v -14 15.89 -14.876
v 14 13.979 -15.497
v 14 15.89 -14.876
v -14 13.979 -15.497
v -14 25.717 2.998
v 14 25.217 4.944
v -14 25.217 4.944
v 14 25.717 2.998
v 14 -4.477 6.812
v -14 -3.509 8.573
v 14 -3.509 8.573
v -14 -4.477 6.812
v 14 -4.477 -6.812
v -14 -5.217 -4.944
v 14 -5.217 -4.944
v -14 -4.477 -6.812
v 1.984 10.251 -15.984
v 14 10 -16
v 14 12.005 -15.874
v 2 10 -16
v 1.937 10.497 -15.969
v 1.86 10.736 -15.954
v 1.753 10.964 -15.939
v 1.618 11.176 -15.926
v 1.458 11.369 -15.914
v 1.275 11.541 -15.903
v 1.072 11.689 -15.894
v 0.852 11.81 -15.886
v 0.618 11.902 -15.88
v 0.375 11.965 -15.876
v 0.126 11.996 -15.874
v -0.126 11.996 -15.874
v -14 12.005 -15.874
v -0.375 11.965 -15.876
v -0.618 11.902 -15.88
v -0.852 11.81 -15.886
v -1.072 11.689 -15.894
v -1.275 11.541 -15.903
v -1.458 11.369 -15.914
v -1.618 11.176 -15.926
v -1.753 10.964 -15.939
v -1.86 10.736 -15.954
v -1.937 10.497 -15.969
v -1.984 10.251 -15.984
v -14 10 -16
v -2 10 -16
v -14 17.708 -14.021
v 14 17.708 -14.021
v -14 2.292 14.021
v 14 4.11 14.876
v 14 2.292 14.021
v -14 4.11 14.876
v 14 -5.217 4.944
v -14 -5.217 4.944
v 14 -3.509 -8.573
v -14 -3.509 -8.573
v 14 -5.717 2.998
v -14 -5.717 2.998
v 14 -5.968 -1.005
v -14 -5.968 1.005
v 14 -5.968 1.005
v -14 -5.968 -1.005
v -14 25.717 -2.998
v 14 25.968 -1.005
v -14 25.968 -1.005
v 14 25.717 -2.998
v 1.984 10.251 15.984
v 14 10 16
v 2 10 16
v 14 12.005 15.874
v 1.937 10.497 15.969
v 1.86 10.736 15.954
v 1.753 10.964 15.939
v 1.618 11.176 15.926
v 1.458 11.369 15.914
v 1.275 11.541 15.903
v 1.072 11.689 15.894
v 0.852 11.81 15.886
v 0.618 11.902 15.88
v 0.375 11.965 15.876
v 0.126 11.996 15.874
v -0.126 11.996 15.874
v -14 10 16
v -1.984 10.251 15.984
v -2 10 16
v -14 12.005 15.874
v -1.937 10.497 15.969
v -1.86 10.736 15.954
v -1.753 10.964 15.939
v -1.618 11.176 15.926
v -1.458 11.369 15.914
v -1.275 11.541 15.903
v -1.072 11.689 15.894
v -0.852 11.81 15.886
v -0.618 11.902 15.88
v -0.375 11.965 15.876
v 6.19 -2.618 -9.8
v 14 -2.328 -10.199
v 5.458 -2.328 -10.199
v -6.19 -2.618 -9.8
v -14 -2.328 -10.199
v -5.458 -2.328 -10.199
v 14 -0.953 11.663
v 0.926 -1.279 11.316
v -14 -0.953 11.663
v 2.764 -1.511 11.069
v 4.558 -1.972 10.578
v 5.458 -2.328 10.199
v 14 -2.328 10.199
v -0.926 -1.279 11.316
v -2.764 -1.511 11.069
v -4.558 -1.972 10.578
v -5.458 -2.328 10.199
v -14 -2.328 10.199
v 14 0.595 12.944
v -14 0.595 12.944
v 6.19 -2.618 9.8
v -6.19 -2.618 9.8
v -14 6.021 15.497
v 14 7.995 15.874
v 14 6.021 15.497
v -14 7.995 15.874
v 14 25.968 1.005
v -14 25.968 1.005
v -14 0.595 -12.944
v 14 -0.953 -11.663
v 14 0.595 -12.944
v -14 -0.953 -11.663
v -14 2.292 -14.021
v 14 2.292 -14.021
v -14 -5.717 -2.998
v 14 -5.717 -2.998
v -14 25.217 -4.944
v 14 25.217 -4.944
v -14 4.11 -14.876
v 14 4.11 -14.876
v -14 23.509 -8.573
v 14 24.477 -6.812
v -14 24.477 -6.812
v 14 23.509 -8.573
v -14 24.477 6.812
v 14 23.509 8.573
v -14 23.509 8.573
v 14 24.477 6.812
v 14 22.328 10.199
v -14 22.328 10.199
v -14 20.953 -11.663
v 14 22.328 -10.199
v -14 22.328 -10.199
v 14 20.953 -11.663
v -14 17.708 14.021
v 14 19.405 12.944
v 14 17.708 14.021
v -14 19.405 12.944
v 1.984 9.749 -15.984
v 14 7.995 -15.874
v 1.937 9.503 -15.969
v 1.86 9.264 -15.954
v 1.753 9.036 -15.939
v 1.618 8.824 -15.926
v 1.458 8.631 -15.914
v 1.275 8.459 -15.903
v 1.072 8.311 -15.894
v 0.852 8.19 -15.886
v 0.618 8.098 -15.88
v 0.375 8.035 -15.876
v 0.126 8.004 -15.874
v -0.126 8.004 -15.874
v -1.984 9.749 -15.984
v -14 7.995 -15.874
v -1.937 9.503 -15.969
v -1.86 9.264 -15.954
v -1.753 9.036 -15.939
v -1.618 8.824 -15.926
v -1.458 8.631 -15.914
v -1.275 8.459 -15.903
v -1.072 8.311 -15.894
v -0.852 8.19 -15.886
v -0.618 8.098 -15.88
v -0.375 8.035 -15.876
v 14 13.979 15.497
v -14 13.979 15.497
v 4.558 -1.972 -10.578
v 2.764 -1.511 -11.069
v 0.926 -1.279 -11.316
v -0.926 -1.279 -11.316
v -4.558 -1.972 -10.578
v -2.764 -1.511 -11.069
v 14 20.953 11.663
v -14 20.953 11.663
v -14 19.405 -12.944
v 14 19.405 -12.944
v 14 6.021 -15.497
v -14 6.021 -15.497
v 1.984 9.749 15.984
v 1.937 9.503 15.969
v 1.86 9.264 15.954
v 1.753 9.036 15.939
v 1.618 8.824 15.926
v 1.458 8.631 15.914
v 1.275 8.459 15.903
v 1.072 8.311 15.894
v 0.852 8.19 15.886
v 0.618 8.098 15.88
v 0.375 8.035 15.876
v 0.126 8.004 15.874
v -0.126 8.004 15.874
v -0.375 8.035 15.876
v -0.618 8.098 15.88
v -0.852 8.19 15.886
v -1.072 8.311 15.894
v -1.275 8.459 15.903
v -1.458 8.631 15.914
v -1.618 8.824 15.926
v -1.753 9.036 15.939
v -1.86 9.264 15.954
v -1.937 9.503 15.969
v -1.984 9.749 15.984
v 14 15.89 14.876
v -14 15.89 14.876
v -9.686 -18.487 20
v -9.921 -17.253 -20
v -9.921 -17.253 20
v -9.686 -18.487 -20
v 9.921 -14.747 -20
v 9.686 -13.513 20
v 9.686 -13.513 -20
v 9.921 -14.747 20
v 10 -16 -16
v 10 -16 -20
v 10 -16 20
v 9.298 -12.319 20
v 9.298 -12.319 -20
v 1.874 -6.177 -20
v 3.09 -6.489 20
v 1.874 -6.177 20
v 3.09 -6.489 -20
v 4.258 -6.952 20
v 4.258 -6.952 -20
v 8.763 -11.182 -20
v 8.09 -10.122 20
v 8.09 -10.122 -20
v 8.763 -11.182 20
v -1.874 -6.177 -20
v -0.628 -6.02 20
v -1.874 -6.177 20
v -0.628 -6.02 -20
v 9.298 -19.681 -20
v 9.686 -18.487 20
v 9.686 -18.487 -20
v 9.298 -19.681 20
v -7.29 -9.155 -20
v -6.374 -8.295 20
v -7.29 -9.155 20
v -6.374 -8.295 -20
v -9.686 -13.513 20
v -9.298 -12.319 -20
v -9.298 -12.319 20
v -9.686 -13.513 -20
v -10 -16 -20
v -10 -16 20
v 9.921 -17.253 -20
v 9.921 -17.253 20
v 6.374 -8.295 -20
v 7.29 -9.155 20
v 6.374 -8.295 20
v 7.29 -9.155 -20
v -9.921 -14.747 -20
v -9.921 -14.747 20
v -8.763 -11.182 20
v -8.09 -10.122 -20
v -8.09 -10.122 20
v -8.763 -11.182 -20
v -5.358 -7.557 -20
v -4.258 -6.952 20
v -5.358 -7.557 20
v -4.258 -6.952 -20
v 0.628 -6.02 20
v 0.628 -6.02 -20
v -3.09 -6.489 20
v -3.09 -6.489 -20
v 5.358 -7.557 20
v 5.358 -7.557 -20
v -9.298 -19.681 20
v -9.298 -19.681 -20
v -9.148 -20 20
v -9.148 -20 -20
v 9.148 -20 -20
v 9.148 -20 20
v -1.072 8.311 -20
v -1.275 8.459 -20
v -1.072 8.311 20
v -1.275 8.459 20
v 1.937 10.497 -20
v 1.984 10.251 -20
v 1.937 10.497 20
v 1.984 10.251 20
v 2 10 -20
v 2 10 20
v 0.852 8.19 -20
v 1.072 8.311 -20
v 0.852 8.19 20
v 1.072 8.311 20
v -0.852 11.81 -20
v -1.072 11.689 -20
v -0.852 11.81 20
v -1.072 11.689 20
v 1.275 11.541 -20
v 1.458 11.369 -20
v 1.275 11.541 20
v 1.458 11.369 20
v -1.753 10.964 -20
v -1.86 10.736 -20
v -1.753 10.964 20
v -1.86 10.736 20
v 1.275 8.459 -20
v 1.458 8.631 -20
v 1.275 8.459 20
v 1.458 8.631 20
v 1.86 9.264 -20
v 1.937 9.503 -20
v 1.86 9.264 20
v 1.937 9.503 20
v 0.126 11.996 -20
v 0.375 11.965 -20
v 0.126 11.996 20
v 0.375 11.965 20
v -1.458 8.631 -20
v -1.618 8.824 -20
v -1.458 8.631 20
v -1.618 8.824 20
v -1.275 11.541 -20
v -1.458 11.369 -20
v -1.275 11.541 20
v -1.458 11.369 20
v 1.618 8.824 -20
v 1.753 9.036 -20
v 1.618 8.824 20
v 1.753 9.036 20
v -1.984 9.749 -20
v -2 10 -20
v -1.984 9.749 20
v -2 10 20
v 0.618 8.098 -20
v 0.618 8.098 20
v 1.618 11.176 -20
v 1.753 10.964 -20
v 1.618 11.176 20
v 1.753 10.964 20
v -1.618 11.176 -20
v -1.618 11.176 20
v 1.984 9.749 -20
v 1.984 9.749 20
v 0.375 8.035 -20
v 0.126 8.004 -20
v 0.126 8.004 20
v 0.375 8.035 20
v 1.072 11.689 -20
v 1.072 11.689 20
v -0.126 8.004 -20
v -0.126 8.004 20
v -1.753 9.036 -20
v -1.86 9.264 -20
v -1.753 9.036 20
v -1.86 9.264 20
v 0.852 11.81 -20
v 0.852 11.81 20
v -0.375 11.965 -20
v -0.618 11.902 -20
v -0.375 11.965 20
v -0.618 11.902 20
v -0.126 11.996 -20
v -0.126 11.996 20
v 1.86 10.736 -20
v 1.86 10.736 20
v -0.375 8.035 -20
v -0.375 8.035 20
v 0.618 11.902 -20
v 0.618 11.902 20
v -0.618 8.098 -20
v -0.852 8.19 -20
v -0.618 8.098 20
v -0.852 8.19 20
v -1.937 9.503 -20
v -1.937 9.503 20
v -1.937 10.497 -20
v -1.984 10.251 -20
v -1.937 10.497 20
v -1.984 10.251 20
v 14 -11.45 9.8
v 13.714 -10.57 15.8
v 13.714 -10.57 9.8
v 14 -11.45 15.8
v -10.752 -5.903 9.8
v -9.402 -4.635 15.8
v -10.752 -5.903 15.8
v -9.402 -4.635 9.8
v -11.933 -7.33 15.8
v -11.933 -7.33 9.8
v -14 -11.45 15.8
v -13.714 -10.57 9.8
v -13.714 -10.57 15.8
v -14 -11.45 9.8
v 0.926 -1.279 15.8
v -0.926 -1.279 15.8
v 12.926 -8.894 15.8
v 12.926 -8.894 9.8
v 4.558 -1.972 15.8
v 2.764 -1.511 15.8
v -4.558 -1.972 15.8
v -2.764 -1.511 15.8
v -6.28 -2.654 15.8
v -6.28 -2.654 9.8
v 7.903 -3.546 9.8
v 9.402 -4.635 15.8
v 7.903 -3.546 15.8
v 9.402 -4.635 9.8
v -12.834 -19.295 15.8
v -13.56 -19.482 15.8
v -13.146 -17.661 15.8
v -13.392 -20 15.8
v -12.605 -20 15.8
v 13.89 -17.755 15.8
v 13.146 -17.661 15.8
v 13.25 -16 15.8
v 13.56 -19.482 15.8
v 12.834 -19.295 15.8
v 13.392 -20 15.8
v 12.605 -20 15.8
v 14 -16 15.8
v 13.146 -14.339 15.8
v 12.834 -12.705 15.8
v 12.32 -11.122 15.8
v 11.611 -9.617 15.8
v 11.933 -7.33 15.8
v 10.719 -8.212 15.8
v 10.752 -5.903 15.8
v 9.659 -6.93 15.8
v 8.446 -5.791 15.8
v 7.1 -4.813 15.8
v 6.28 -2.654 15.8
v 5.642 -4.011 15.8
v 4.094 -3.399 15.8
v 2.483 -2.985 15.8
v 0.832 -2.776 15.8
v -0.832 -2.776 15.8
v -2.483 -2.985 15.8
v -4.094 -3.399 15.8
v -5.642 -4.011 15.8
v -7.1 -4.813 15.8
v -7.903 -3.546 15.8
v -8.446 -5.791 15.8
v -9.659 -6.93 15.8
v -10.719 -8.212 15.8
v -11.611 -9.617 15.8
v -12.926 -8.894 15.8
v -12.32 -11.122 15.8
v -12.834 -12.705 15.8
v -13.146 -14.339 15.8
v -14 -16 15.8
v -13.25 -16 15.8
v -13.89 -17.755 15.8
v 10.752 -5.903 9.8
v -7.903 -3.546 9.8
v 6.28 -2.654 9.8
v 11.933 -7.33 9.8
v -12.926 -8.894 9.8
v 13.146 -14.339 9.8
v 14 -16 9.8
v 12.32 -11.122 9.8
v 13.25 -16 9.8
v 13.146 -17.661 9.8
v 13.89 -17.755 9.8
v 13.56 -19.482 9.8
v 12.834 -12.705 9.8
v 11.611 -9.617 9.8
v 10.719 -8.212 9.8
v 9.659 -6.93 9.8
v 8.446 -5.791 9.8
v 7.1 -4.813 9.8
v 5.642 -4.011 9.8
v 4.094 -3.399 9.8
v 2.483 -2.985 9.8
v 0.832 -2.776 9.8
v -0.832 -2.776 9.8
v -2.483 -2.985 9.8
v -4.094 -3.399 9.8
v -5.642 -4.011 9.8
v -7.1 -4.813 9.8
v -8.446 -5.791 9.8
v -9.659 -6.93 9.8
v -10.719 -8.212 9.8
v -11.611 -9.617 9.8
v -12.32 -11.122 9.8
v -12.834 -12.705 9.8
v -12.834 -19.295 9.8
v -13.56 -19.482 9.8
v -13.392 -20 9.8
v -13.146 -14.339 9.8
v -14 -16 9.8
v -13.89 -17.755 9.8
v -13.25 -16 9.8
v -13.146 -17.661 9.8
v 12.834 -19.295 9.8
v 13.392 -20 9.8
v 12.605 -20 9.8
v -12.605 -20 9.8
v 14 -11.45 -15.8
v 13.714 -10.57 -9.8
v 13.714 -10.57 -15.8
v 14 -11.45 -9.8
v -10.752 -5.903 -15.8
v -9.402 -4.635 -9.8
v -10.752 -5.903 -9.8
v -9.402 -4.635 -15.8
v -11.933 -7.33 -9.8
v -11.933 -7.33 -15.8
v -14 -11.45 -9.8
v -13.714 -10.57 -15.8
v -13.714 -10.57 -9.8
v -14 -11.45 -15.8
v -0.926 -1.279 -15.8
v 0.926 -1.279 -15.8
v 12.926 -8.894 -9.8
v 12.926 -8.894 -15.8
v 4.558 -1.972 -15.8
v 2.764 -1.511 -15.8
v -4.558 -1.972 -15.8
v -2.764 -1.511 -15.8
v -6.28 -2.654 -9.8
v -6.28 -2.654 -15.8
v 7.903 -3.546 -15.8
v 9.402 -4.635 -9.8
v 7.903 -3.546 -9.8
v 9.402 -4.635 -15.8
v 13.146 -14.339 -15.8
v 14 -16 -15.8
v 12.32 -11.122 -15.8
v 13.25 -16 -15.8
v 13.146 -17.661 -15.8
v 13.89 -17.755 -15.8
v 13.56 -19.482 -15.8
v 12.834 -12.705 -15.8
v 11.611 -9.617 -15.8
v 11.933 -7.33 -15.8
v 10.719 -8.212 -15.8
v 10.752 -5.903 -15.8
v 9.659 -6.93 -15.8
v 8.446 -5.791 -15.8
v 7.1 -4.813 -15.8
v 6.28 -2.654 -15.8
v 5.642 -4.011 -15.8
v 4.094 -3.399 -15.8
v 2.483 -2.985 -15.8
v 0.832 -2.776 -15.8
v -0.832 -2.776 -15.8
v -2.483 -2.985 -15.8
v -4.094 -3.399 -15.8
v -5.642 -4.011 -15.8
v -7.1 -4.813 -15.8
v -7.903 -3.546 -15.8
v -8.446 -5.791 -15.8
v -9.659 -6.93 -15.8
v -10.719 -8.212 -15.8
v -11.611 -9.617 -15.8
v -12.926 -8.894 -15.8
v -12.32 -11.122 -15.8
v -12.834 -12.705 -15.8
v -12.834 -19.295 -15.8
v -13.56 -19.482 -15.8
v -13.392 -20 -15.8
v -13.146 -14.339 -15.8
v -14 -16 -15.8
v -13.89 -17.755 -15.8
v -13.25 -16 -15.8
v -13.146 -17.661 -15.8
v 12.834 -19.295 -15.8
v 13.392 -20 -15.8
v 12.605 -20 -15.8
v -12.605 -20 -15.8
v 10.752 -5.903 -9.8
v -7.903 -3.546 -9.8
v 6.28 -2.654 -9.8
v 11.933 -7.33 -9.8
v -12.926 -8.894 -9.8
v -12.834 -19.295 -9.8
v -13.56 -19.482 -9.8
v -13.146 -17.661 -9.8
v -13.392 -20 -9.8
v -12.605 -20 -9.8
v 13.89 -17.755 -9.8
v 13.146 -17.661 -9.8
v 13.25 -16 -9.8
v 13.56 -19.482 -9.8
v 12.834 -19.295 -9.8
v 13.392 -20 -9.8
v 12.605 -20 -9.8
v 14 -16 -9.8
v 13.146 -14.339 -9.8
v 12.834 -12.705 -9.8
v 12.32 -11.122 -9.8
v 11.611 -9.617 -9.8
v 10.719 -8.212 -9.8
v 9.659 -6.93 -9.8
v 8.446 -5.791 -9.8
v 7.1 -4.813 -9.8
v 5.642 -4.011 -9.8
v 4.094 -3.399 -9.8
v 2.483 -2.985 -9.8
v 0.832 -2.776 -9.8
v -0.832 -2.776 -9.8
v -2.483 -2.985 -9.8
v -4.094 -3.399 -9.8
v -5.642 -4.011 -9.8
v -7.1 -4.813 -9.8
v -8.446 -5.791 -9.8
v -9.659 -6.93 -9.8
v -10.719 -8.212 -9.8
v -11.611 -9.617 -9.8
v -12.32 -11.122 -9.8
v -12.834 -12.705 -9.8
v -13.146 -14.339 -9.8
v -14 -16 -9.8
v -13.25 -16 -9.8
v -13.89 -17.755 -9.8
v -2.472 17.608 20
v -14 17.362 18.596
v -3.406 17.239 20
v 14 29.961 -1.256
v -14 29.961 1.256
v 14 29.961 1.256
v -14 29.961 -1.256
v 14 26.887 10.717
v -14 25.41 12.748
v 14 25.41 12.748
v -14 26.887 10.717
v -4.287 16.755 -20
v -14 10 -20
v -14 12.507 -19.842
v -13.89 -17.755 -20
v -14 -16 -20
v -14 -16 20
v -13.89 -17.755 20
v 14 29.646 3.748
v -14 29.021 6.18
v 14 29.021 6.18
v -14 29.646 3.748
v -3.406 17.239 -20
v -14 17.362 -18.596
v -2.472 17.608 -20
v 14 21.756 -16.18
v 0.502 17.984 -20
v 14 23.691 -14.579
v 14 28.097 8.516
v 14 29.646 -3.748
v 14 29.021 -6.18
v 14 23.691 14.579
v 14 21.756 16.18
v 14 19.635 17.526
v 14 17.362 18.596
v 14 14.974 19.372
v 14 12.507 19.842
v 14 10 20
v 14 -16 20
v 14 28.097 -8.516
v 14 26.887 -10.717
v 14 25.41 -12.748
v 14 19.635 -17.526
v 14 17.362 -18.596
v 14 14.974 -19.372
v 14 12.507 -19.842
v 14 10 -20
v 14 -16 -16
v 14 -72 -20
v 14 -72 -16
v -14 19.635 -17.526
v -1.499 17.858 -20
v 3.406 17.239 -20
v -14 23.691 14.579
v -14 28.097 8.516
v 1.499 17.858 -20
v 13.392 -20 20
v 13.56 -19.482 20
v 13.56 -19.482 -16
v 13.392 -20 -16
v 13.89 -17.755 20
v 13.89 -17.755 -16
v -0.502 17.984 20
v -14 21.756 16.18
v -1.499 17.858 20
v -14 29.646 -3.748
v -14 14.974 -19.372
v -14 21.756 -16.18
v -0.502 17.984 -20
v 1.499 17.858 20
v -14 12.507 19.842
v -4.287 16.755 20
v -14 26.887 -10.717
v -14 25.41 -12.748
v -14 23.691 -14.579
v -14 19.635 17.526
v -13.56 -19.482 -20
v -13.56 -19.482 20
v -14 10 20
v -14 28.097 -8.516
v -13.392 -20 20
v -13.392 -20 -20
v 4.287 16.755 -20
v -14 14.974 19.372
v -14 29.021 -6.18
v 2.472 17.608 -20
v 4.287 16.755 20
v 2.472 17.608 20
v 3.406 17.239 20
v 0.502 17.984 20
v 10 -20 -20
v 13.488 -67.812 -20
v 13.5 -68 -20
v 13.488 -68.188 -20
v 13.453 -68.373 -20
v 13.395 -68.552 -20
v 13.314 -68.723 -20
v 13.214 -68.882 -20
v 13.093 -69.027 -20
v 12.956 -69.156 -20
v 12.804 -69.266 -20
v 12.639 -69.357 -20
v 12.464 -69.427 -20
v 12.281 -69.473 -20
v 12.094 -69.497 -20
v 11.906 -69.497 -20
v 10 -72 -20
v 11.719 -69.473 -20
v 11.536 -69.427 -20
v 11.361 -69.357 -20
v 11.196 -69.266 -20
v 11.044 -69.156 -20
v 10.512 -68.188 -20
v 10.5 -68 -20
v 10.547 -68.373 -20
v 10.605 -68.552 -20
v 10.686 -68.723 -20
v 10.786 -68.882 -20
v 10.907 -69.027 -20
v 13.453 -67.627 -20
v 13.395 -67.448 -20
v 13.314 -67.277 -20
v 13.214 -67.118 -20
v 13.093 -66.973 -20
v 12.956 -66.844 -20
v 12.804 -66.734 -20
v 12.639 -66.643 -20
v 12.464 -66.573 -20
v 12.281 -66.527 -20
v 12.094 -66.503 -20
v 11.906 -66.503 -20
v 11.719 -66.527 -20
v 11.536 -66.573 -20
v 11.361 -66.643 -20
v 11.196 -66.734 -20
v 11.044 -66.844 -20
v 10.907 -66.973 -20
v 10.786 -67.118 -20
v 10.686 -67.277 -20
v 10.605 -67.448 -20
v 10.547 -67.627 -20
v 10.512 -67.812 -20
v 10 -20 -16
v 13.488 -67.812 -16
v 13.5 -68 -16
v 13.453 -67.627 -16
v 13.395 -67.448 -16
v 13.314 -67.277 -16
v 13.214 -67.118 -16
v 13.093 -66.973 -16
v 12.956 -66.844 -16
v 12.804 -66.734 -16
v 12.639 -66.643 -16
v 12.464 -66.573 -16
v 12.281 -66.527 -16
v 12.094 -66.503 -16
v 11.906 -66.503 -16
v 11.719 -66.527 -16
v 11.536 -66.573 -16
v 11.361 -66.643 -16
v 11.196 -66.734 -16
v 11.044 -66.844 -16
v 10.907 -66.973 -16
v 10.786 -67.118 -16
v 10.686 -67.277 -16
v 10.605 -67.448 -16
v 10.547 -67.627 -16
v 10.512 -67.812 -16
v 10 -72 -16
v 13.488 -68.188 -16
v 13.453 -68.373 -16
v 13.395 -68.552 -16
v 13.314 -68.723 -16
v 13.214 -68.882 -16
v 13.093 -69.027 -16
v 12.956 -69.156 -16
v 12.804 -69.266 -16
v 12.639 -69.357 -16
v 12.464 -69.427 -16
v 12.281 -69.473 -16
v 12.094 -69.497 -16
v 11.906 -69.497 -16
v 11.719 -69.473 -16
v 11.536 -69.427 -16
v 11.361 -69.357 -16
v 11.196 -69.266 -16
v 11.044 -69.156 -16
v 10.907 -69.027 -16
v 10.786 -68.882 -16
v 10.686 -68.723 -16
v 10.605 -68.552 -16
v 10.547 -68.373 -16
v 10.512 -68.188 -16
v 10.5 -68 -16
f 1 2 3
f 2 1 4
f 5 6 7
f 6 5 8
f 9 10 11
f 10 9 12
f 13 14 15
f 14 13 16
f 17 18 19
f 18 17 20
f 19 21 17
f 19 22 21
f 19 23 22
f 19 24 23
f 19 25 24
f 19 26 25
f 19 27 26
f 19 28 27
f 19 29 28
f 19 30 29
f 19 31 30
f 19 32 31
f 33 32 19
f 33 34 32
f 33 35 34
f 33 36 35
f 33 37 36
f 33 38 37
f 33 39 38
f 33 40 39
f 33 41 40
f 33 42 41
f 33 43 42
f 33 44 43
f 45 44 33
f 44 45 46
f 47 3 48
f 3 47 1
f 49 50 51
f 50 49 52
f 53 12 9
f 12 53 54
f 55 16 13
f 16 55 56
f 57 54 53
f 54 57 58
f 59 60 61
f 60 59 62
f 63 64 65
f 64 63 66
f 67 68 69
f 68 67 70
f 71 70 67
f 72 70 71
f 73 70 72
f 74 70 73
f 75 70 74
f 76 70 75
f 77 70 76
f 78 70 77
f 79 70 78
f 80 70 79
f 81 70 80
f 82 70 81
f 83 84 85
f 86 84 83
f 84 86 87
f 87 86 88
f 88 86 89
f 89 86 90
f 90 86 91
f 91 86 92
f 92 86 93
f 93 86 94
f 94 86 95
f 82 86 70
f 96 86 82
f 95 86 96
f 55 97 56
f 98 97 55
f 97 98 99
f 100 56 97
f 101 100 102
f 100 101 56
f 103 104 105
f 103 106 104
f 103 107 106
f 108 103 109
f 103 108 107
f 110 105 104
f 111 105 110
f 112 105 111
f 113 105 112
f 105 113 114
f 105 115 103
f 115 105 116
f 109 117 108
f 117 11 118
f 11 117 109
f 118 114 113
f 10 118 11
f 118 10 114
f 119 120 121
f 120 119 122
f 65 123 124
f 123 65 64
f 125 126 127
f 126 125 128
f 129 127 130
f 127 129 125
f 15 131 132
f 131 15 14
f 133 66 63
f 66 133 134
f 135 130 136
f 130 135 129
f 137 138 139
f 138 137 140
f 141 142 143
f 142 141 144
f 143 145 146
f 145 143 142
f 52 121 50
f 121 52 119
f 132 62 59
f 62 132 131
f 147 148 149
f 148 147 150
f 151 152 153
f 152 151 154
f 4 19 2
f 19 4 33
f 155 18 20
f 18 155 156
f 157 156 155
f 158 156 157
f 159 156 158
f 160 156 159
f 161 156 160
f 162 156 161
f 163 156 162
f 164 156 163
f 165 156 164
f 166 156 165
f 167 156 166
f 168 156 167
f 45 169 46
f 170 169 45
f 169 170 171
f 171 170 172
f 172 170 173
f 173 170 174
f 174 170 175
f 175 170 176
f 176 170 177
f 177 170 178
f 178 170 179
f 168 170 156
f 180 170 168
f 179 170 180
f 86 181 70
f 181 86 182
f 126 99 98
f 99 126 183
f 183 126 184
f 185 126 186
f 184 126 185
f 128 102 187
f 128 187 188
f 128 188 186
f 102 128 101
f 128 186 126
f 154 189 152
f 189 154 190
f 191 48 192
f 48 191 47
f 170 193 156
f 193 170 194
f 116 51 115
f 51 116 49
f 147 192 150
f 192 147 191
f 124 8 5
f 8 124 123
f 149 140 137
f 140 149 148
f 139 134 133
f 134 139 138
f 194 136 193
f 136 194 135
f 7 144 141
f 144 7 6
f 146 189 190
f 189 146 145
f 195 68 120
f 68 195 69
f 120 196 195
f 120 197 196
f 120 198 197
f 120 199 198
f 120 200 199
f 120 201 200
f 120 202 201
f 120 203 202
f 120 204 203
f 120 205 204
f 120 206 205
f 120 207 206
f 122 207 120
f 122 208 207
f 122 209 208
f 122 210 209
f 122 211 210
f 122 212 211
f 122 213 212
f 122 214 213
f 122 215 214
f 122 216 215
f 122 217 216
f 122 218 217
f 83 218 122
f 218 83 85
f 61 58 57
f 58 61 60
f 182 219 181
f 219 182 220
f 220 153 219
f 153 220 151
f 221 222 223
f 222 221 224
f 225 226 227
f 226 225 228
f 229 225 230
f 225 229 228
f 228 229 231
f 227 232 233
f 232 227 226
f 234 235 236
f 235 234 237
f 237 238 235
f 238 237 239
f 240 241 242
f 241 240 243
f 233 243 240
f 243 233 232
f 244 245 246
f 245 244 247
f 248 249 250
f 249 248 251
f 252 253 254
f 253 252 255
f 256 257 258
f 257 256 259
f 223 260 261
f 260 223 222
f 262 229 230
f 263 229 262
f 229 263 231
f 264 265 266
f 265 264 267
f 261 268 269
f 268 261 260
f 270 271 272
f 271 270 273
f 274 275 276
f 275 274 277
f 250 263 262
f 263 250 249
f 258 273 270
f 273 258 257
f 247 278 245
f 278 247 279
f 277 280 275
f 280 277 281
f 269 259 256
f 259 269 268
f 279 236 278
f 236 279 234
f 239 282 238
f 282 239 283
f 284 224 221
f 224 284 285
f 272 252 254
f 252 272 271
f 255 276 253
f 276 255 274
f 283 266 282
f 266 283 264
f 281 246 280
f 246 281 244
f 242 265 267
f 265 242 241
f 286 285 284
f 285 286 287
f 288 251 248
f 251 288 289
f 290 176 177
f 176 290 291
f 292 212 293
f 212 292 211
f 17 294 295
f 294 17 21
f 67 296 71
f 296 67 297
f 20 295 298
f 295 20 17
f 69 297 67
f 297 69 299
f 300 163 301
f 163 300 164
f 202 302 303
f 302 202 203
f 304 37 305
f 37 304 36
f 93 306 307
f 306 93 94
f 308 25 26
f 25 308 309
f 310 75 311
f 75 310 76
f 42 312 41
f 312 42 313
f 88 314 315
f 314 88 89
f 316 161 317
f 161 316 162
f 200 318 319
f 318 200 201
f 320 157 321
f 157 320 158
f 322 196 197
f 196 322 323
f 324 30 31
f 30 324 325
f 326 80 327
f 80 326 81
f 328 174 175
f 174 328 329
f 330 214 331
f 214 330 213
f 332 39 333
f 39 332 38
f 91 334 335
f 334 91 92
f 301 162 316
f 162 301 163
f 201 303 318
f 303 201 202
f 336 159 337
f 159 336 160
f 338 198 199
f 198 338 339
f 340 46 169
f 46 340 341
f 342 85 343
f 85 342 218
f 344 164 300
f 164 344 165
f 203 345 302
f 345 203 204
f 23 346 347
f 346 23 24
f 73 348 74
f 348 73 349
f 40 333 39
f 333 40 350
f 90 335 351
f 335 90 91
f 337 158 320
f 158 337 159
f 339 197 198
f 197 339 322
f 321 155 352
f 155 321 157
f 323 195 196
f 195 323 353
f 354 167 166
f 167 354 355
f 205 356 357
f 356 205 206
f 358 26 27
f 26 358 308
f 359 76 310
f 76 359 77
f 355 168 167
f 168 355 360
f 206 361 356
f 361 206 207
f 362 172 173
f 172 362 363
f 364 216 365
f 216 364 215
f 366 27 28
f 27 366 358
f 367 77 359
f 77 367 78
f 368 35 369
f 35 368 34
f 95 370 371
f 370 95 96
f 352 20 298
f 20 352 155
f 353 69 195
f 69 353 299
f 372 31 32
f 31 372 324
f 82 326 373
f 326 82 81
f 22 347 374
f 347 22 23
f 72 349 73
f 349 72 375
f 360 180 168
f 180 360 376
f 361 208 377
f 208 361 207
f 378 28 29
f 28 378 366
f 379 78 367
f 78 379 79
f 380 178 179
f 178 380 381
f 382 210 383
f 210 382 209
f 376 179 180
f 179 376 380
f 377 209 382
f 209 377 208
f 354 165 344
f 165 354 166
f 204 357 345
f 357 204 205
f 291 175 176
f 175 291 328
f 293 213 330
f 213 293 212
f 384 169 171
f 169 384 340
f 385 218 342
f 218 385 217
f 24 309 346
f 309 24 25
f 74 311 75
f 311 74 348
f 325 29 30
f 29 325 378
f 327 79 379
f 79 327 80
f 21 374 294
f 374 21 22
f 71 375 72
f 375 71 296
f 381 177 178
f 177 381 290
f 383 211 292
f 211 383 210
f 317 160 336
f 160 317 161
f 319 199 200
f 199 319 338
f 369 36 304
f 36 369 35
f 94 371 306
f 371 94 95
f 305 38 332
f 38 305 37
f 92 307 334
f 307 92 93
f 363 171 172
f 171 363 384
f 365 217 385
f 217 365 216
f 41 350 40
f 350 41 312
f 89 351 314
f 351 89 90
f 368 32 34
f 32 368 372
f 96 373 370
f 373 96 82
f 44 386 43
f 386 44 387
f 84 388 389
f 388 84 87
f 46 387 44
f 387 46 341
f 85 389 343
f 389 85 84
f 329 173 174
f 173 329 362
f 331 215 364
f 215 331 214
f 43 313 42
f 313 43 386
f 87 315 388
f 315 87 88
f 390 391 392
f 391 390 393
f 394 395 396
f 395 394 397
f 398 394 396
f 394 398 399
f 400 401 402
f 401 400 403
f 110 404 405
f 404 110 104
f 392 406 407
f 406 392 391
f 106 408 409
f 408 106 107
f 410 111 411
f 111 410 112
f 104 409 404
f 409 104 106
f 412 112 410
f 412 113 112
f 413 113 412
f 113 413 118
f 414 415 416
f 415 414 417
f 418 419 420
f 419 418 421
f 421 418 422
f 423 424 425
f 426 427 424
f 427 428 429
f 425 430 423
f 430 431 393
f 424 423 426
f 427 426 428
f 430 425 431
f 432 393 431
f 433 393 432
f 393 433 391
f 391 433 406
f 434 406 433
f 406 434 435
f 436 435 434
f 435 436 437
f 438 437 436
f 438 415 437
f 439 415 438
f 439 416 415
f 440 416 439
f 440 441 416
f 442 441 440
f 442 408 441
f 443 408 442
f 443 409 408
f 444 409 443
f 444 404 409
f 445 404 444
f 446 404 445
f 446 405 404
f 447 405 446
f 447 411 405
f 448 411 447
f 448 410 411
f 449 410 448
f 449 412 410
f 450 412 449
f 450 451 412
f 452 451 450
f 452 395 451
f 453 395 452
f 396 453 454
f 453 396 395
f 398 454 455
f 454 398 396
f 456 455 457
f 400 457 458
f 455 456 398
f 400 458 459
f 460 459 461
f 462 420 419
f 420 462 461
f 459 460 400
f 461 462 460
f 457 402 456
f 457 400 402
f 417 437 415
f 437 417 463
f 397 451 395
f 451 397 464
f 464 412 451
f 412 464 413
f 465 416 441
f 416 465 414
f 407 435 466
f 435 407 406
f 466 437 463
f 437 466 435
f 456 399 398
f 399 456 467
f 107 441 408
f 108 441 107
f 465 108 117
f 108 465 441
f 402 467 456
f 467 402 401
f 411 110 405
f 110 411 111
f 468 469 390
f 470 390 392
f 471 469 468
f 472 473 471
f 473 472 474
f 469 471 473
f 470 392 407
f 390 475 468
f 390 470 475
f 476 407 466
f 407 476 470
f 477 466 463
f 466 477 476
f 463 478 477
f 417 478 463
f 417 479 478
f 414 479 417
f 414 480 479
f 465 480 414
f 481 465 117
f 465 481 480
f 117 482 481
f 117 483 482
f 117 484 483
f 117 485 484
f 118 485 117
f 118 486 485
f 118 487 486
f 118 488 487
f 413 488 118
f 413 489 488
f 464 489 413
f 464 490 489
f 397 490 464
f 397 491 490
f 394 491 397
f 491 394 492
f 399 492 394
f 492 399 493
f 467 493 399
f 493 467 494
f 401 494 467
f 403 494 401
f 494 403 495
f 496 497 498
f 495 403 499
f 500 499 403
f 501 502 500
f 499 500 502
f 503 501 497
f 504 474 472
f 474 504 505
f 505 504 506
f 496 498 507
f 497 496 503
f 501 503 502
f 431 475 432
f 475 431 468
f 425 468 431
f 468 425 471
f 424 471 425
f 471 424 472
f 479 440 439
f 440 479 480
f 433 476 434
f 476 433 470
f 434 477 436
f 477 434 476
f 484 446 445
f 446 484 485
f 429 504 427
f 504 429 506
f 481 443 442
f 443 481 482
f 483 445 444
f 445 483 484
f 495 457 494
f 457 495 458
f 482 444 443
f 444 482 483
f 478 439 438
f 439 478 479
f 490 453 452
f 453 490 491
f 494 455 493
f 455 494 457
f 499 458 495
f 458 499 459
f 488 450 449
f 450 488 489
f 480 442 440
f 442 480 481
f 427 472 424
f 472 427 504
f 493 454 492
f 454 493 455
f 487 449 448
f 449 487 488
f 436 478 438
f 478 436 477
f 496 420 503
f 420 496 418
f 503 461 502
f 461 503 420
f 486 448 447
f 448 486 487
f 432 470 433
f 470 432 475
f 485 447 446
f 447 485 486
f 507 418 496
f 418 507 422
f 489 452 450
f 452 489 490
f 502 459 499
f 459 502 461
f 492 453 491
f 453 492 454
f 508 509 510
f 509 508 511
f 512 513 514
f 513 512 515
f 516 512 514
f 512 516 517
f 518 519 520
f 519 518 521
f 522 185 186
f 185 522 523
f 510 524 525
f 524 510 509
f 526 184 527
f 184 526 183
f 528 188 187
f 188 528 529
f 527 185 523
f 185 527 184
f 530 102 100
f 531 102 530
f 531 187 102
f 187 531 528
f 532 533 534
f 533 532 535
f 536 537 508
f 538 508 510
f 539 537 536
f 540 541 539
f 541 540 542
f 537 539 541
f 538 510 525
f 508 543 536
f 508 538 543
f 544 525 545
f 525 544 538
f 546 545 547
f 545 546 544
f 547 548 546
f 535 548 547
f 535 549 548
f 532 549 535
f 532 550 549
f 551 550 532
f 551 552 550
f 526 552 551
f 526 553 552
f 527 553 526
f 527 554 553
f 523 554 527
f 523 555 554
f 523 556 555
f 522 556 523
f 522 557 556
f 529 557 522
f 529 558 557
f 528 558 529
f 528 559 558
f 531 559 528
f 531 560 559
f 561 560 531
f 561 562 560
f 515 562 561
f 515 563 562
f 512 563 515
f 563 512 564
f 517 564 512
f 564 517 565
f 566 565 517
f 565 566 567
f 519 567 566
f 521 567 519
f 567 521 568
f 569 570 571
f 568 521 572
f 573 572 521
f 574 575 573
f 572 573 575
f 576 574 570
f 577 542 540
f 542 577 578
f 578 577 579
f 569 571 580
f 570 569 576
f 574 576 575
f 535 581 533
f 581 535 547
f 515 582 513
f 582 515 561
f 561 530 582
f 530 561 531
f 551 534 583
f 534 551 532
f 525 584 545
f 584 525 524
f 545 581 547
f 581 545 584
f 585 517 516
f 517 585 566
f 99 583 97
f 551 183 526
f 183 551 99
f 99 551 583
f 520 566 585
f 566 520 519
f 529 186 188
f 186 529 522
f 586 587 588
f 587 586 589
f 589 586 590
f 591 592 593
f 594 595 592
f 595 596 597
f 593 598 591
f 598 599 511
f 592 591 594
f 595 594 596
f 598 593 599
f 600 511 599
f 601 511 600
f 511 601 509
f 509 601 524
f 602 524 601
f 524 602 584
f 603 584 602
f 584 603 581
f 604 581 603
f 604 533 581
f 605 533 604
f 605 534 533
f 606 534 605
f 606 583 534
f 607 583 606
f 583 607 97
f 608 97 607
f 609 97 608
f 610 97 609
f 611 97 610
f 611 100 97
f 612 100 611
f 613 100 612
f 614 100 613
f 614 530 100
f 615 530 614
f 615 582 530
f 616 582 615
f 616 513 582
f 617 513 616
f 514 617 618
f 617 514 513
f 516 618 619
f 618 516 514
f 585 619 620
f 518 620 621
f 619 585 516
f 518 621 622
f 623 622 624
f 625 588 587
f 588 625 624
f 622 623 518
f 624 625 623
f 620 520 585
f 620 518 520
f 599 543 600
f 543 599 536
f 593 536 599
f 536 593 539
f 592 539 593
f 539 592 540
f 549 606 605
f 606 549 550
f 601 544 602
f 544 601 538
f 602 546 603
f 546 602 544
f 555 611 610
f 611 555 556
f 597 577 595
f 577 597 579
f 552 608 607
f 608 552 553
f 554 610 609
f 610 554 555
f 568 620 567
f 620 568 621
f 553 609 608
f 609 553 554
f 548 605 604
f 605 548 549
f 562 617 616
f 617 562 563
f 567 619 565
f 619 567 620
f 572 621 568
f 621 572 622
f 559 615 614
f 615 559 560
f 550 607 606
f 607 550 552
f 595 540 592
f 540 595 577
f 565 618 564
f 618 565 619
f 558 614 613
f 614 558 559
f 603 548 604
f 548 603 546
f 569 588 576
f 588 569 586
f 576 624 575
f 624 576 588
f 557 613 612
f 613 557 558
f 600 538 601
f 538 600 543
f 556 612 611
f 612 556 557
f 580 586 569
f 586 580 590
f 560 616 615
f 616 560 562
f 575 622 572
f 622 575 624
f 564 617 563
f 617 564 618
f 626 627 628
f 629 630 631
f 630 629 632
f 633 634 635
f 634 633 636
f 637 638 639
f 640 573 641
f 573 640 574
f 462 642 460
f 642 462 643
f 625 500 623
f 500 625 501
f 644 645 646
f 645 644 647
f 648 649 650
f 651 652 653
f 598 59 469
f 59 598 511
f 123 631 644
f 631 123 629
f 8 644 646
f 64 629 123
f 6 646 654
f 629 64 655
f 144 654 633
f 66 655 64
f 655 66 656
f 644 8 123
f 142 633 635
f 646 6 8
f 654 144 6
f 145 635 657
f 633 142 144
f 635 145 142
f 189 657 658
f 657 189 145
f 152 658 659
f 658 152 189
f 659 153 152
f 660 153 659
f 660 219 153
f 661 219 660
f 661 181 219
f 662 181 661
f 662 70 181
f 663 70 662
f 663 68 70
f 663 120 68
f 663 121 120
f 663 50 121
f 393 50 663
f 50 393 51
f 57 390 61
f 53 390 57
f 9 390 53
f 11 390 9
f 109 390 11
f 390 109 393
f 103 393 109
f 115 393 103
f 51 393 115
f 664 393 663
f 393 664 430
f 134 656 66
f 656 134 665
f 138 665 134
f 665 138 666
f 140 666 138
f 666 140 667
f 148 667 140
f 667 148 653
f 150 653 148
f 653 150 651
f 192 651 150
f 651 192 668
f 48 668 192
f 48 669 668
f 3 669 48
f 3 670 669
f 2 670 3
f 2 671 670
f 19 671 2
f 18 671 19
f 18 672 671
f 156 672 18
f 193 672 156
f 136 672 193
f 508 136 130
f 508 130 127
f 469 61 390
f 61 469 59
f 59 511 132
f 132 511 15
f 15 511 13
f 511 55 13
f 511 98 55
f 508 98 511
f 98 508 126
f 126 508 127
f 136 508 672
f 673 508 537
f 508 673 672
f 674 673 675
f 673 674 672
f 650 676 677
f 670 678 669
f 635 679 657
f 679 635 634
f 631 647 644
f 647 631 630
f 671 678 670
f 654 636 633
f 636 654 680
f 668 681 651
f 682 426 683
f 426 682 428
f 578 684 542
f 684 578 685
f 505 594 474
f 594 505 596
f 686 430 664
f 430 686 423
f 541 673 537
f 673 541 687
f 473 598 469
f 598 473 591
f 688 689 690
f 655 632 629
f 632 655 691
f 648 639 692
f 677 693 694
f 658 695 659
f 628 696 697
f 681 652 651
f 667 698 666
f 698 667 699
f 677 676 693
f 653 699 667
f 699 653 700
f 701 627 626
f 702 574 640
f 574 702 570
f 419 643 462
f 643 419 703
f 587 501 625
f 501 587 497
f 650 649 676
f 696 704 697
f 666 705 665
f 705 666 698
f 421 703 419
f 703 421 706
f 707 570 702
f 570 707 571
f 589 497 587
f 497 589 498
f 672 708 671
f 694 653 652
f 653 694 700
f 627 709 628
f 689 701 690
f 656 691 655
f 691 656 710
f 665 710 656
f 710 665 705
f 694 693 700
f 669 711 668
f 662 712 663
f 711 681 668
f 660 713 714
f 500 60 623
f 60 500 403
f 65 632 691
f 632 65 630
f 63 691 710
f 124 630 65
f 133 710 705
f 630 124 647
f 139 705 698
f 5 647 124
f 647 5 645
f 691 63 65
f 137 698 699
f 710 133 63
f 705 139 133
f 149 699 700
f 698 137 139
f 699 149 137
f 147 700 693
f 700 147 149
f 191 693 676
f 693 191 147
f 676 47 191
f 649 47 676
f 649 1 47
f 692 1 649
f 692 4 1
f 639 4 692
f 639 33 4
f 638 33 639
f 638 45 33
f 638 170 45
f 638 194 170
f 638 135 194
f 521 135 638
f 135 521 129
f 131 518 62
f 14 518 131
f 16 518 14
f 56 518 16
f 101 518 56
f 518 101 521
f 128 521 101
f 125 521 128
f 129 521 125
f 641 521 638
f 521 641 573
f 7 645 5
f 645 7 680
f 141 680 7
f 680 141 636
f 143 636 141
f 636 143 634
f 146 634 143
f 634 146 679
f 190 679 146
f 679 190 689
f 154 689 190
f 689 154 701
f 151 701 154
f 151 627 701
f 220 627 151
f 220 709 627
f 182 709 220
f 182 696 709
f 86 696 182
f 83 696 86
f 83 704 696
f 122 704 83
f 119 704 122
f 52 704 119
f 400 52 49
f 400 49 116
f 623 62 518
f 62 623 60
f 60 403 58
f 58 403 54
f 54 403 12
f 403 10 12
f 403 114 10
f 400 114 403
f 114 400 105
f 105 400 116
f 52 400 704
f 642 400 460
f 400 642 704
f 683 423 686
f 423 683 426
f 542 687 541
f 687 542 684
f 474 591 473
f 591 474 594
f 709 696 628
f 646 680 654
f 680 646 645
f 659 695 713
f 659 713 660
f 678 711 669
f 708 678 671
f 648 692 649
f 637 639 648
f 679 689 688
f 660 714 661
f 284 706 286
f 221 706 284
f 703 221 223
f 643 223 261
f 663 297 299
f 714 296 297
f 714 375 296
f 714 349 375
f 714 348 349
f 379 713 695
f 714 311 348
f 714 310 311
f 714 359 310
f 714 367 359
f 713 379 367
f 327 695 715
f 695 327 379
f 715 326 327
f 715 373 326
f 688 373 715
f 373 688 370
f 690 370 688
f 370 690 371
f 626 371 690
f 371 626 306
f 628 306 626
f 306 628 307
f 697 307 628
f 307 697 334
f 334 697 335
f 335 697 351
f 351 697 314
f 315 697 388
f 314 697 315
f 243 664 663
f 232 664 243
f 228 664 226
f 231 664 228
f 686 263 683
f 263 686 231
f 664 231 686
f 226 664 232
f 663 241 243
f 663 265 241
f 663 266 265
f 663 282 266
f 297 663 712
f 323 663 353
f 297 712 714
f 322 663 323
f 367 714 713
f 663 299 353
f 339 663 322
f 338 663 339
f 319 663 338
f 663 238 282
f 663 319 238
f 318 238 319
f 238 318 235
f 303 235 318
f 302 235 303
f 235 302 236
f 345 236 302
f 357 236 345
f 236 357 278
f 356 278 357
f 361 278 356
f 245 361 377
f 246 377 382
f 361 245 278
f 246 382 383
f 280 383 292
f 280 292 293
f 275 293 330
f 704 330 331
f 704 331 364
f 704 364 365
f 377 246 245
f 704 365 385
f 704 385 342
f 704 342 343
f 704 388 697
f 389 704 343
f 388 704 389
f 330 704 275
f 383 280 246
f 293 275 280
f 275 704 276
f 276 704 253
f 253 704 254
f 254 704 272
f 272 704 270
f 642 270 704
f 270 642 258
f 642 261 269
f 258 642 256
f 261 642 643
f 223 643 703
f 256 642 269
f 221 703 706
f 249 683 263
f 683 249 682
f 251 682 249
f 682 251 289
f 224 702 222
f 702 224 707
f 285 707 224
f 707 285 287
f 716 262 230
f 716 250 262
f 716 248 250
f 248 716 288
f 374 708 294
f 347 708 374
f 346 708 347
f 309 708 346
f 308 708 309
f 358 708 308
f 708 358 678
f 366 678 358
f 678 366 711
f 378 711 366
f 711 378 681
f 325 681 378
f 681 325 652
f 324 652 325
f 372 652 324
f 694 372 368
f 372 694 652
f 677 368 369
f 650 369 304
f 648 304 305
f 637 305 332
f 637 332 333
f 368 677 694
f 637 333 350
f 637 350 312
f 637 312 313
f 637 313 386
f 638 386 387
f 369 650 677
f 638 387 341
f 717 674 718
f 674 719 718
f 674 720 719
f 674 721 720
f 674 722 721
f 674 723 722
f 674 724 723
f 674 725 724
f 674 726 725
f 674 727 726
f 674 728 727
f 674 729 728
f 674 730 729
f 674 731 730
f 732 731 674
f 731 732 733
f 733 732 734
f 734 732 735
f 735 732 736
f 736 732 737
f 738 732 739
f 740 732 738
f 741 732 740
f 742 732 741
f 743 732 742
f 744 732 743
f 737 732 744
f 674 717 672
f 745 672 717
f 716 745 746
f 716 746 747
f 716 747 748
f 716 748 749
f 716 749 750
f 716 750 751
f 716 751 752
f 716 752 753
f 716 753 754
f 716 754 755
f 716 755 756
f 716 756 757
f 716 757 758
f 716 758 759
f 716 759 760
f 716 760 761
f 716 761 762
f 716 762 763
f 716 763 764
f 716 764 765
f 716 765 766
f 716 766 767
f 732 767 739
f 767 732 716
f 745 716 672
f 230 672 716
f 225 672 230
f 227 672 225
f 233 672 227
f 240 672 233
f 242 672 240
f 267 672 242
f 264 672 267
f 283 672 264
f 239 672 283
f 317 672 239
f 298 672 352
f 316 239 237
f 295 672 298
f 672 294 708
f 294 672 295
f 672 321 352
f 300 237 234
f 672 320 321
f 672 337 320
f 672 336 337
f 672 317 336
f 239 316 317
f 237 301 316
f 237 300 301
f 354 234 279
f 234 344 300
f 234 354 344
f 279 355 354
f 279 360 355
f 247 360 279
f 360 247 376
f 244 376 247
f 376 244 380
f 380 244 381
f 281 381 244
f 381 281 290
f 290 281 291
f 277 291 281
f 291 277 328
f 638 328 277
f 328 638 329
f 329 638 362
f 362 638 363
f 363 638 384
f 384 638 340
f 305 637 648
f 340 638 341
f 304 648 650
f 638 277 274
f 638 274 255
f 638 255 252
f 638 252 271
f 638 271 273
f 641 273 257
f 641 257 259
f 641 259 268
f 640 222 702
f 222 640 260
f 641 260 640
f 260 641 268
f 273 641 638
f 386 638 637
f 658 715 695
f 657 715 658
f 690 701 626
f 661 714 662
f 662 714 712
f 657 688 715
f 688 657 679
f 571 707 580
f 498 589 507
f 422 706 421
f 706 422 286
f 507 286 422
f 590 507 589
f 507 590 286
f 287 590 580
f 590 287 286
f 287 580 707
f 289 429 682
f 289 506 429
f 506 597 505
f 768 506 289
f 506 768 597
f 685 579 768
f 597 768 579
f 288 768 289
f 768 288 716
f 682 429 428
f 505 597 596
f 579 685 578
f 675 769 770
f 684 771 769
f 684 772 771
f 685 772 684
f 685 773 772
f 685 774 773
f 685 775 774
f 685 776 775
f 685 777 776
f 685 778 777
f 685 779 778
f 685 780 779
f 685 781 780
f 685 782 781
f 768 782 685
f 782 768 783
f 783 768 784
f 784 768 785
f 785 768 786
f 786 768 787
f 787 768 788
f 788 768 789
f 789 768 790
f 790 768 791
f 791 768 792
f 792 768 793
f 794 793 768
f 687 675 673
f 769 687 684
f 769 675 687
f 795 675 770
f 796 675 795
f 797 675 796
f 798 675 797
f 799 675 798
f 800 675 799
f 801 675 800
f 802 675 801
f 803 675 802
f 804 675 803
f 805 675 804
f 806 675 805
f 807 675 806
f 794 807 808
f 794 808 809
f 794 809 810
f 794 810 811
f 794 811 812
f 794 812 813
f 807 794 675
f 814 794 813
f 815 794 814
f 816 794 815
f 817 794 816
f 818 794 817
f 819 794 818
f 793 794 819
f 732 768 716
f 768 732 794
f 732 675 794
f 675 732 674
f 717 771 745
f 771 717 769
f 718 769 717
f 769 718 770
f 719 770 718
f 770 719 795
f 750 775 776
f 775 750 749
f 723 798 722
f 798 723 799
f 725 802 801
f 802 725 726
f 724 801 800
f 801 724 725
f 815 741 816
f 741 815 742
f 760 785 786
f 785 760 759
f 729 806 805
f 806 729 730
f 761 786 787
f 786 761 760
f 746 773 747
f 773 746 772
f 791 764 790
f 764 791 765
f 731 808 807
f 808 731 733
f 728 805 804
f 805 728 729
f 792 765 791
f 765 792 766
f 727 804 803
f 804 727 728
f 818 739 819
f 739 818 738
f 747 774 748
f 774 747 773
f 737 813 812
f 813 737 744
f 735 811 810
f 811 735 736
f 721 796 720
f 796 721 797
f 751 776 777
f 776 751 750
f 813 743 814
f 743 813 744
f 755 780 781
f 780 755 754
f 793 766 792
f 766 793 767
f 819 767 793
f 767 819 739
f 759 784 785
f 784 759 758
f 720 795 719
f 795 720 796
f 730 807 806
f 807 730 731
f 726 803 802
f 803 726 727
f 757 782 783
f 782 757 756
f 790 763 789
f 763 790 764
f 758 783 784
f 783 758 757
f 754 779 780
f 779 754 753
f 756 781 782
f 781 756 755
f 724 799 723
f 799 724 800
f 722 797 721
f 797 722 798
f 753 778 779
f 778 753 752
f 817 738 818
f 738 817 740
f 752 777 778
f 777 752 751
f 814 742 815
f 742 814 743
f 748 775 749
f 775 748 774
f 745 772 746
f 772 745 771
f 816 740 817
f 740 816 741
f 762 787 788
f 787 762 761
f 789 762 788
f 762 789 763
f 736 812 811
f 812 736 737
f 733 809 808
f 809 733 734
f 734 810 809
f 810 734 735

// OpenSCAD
// Antenna to axis mount
// Satnogs Project 2014 MPL2.0 http://satnogs.org

$fn=50;

mast_1 = 32;		 // Axis mast diameter
mast_2 = 20;		 // Antenna mast diameter
offset = 8;			 // Extra width of mount
tireup_w = 6; 		 // Width of tireup
tireup_h = 1.5;	 // Height of tireup
washer = 16;		 // Washer diameter
bolt = 4;			 // Bolt for antenna mast


module axises() {
	translate([0,(mast_1+mast_2)/2-mast_1/2,0])
		rotate([0,90,0])
			cylinder(h=mast_2+offset+1, d=mast_1, center=true);
	translate([0,-(mast_1+mast_2)/2+mast_2/2,0])
		cylinder(h=mast_1+offset+1, d=mast_2, center=true);
	// Bolt for antenna mast cylinder
	translate([0,(mast_1+mast_2)/2-mast_1/2,0])
		cylinder(h=mast_1+offset+1, d=bolt, center=true);
}

module axises_outer() {
	translate([0,(mast_1+mast_2)/2-mast_1/2,0])
		rotate([0,90,0])
			cylinder(h=mast_2+offset, d=mast_1+offset, center=true);
	translate([0,-(mast_1+mast_2)/2+mast_2/2,0])
		cylinder(h=mast_1+offset, d=mast_2+offset, center=true);
	// Outer washer stud
	translate([0,(mast_1+mast_2)/2-mast_1/2,0])
		cylinder(h=mast_1+offset, d=washer, center=true);
}

module tire_up() {
	difference() {
		cylinder(h=tireup_w,d=mast_2+offset+tireup_h,center=true);
		cylinder(h=tireup_w,d=mast_2+offset-tireup_h,center=true);
	}
}

module cut() {
	translate([0,-(mast_1+mast_2)/2,0])
		cube([offset*5,offset*1.5,mast_1+offset*4],center=true);
}

module main_connector() {
	difference() {
		hull() {
			axises_outer();
		}
		axises();
		mirror([0,0,1]) {
			translate([0,-(mast_1+mast_2)/2+mast_2/2,(2*mast_1)/5])
				tire_up();
		}
		translate([0,-(mast_1+mast_2)/2+mast_2/2,(2*mast_1)/5])
			tire_up();
		cut();
	}
}

module extender() {
	difference() {
		translate([mast_1/2-offset/2,-mast_2*2,-mast_1/2-offset/4])
			cube([offset/2,mast_1*2,offset/2],center=true);
		translate([mast_1/2-offset/2,-mast_1*2-4,-mast_1/2-offset/4])
			cylinder(d=3,offset/2,center=true);
	}
}

difference() {
	union() {
		main_connector();
		extender();
	}
}
